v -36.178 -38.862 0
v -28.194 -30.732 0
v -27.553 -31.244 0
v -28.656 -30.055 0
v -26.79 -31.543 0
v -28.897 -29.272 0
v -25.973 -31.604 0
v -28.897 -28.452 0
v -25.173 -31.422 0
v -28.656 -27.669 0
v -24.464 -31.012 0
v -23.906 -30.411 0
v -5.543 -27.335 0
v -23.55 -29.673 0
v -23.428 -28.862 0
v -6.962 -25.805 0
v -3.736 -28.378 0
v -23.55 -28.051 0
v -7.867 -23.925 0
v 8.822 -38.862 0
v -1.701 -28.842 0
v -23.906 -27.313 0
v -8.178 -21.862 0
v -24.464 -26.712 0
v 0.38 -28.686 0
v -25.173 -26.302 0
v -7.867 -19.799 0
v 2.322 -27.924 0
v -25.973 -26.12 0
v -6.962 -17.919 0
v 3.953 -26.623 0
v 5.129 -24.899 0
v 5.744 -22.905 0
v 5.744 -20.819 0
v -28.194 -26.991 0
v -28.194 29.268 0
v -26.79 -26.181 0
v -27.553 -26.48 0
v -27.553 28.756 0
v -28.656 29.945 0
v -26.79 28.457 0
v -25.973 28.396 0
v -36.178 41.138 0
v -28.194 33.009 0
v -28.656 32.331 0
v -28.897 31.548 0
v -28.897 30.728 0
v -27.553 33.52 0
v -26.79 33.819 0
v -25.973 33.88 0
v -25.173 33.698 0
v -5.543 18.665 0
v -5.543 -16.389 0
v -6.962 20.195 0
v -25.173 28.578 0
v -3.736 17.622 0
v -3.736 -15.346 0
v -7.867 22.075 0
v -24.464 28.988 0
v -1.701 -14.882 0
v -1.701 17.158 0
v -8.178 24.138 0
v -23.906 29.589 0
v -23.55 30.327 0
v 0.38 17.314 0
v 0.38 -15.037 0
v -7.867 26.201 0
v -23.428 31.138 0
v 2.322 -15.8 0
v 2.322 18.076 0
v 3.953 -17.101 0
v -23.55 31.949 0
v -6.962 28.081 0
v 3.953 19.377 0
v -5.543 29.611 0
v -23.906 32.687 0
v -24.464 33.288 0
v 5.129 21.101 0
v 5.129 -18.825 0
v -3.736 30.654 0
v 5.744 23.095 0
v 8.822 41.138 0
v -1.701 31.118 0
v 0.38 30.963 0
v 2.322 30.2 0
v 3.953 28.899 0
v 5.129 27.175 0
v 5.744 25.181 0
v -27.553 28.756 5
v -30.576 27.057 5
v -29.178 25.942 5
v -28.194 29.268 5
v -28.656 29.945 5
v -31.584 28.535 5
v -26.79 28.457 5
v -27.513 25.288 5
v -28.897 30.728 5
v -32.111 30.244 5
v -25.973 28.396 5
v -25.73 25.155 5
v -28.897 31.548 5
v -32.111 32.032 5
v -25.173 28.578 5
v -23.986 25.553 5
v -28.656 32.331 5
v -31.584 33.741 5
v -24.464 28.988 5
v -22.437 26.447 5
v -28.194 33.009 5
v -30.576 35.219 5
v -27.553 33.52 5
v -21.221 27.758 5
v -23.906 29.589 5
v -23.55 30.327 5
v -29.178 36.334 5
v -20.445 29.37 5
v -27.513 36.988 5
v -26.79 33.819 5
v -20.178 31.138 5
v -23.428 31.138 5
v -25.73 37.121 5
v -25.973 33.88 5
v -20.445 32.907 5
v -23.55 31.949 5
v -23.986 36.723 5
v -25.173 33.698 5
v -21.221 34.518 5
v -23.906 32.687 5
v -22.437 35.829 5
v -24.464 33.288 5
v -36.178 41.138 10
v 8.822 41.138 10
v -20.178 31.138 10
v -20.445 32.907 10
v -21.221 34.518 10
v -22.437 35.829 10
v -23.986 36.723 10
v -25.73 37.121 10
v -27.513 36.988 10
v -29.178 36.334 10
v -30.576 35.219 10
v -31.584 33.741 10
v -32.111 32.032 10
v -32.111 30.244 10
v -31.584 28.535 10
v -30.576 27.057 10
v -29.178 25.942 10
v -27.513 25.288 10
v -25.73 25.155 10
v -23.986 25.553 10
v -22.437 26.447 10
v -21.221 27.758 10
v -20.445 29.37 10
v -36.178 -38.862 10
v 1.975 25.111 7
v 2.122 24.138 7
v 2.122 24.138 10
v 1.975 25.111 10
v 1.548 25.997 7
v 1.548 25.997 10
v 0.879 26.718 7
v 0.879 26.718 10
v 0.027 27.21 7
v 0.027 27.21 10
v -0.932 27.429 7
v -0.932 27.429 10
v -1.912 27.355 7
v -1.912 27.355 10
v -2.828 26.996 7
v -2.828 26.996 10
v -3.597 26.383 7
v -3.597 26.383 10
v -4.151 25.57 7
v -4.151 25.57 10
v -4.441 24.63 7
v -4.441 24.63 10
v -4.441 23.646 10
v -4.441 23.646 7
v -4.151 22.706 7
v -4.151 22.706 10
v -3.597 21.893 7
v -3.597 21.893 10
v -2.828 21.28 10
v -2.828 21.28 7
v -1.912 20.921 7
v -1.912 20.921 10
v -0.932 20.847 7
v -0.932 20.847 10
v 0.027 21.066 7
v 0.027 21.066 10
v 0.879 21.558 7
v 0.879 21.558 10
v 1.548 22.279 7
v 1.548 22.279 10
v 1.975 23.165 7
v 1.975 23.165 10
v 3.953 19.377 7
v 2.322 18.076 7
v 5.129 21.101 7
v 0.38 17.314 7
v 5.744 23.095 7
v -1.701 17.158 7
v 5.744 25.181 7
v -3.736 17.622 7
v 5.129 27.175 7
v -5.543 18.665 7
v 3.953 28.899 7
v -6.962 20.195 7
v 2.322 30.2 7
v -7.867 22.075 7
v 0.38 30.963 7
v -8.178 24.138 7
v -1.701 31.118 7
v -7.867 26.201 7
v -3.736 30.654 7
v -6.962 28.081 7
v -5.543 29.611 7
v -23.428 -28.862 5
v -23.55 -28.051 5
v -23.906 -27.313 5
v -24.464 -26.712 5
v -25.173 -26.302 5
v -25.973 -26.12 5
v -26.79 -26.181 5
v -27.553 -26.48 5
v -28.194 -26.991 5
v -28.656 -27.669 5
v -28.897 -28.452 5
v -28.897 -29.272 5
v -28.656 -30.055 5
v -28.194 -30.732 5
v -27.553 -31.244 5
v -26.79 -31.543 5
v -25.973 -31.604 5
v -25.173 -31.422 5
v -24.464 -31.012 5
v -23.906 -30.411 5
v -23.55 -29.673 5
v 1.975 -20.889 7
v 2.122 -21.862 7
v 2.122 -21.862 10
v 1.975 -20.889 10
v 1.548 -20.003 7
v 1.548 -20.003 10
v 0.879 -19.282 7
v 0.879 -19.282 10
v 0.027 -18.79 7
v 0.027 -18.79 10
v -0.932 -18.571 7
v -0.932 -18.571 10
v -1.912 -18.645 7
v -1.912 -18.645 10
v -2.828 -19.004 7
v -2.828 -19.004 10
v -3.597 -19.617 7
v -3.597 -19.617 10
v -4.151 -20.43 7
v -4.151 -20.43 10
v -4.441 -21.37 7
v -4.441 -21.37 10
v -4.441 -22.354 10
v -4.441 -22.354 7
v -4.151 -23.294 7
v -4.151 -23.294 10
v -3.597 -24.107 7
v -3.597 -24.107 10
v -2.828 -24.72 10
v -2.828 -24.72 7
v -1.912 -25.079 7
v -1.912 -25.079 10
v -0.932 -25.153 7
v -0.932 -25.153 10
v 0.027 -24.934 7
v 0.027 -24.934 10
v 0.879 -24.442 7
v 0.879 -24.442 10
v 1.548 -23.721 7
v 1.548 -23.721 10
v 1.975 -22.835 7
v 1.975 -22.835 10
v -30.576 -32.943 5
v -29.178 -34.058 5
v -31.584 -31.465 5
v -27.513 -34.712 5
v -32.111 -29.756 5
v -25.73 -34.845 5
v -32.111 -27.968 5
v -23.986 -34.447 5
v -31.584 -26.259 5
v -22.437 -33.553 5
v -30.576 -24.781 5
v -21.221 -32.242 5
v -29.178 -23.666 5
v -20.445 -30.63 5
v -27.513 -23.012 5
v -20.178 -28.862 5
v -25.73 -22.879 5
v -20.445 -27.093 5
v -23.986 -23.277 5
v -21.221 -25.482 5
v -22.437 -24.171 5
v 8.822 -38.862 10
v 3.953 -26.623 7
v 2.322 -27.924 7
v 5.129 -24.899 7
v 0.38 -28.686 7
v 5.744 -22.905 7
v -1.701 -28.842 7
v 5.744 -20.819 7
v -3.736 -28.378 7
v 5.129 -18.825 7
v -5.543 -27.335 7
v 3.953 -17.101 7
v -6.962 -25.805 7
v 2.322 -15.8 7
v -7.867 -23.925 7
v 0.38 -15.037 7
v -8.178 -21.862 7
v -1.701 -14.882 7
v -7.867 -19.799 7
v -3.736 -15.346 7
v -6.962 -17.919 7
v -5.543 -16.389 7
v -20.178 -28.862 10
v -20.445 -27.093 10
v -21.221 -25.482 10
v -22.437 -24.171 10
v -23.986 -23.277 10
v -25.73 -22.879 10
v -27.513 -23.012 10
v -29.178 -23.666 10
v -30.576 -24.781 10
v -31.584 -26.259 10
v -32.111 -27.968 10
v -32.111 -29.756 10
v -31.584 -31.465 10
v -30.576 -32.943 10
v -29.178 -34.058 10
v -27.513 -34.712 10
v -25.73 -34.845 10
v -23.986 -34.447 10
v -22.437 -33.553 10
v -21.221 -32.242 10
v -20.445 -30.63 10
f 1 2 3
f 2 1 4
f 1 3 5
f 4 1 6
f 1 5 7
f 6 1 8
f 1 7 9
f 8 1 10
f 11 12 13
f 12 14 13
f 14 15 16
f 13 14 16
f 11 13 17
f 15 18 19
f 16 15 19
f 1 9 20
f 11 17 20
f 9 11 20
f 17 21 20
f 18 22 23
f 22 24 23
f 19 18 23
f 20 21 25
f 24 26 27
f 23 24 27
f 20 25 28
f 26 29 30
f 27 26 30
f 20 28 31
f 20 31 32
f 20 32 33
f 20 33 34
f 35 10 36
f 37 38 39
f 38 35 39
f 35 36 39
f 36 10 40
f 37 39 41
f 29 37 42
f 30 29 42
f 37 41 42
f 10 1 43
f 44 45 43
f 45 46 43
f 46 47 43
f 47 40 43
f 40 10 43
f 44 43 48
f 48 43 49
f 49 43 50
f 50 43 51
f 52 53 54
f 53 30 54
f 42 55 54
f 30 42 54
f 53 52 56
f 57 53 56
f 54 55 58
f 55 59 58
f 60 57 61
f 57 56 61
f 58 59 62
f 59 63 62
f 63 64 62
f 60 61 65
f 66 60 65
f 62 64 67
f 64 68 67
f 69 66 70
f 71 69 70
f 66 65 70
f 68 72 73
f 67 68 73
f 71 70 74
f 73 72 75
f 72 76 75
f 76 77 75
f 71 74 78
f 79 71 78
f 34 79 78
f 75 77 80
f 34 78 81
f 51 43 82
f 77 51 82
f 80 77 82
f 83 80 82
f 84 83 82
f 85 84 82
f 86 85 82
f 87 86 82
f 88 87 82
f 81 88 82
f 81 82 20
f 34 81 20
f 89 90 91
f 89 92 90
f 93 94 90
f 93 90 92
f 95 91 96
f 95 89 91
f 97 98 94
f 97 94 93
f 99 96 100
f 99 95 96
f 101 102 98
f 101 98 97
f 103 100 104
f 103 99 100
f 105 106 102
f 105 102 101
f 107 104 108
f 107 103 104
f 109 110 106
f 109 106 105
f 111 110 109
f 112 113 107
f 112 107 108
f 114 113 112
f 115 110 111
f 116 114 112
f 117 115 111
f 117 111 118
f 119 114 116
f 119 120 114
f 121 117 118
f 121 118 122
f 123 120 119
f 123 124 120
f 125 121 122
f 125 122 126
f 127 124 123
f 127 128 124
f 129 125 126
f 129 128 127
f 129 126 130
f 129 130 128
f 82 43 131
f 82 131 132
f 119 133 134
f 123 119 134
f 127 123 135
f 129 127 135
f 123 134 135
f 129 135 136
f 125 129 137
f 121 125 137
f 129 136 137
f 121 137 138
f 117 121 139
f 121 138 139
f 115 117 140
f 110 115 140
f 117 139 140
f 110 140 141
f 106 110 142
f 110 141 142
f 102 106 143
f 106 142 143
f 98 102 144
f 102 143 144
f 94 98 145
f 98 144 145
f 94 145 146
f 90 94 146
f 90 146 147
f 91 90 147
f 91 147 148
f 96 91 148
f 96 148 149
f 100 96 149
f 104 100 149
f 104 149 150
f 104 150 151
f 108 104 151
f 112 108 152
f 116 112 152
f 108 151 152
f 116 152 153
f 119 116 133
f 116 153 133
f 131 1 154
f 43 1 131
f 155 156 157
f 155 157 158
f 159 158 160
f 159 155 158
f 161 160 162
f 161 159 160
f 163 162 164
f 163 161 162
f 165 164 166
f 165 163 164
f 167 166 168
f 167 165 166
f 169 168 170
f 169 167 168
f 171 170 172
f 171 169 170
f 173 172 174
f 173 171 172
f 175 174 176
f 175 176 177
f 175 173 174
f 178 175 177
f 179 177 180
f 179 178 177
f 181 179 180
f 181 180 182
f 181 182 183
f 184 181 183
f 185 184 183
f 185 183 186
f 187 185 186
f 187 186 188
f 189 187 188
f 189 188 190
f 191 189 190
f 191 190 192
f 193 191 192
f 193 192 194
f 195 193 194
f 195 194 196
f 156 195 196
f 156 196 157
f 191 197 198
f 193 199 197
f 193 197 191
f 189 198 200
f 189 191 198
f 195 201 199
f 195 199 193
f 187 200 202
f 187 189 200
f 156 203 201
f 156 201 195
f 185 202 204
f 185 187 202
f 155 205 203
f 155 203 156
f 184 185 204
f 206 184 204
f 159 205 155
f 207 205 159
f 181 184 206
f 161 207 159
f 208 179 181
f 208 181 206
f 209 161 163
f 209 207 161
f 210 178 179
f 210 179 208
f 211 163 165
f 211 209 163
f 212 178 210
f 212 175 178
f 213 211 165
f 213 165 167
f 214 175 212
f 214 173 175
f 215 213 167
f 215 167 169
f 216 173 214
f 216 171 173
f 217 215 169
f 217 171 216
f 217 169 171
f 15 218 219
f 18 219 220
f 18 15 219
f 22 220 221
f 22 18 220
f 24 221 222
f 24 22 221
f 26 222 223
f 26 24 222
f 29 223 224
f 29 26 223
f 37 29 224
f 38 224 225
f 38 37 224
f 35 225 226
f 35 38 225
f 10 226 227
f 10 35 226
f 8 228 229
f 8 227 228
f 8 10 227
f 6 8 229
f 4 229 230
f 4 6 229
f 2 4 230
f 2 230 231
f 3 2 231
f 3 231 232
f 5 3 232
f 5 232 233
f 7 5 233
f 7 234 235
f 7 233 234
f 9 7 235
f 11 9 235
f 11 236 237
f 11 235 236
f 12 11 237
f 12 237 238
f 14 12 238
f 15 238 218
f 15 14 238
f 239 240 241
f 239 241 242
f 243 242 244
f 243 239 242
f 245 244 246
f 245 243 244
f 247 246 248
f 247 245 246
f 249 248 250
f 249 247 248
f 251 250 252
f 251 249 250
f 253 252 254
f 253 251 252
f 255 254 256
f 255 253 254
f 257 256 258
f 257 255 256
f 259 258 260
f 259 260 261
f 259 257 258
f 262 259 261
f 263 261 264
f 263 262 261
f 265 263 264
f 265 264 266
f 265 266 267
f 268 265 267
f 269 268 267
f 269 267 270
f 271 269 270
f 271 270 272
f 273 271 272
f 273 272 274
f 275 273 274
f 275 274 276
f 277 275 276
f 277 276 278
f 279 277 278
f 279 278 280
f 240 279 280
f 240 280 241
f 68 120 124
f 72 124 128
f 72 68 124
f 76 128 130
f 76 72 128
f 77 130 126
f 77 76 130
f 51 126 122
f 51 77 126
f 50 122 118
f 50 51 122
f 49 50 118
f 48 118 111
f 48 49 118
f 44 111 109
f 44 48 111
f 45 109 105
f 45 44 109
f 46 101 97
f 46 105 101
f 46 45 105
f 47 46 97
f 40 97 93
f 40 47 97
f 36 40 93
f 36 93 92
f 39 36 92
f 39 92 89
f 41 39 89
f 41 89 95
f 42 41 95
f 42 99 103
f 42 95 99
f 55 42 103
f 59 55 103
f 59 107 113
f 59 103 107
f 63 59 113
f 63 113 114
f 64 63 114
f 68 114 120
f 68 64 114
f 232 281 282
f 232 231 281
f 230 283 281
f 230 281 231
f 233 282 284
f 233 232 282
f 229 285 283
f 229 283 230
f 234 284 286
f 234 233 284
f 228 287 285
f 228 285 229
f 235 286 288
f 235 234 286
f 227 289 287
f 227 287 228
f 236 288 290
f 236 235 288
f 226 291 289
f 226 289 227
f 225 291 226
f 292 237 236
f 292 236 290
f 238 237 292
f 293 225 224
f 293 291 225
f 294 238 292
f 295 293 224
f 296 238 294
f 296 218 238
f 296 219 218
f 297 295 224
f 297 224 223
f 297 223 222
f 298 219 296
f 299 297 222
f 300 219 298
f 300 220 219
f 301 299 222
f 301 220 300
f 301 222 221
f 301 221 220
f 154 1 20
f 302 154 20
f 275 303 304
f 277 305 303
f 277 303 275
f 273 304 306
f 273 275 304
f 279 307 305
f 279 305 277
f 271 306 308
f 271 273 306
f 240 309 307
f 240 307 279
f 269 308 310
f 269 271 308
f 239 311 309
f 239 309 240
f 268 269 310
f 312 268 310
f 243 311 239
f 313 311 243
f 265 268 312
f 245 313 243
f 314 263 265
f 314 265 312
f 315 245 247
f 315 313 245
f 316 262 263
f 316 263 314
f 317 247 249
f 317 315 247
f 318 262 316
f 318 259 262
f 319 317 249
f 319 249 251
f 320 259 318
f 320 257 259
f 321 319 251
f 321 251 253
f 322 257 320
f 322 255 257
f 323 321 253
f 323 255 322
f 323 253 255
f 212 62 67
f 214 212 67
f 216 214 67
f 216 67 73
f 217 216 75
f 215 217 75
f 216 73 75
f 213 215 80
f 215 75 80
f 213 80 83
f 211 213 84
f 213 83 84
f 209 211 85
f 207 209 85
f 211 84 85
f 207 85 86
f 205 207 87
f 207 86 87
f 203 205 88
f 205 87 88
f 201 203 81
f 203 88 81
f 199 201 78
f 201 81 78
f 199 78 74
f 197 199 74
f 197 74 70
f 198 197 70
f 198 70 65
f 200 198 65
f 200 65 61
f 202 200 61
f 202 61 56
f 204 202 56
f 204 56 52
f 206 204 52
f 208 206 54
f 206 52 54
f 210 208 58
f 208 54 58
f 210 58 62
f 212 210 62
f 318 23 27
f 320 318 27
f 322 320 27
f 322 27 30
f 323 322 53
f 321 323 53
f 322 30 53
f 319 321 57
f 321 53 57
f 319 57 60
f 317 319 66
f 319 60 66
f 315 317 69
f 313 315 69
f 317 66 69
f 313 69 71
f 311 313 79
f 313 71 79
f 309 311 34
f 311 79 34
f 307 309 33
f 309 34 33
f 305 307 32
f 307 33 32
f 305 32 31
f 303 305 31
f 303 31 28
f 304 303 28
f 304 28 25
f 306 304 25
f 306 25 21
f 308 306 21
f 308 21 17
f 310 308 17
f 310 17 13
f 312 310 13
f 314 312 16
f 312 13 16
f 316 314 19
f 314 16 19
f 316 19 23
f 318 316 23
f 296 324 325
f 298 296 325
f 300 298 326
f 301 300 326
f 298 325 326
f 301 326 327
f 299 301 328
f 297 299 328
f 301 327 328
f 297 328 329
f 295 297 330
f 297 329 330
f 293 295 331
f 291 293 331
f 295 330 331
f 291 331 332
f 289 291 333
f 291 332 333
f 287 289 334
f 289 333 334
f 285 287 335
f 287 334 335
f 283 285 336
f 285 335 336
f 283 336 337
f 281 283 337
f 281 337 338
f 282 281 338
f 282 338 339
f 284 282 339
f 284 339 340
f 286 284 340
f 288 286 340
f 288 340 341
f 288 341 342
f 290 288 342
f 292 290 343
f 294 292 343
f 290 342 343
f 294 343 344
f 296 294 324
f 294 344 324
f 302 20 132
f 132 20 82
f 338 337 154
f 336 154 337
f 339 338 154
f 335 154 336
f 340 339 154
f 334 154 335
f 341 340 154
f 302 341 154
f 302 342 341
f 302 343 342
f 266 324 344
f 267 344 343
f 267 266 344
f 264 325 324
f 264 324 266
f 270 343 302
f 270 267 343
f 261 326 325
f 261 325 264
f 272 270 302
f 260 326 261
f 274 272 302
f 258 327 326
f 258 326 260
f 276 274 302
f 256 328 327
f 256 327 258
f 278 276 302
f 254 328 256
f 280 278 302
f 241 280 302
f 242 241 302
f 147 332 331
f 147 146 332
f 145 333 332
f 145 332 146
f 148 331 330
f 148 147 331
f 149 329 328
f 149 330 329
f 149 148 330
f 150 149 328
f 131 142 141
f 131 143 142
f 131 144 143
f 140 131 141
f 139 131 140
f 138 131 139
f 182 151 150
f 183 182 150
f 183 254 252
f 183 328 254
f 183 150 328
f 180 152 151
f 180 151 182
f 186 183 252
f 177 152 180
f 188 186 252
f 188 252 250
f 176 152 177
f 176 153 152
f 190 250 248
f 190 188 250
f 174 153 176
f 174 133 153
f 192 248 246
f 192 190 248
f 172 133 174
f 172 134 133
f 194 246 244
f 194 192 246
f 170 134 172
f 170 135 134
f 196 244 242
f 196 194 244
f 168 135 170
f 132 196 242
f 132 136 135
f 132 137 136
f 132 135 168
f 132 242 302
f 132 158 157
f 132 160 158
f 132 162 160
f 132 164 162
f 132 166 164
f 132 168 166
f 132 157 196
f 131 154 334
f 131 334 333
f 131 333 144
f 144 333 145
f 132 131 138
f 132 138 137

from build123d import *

# Parameters (mm, degrees)
ESQUISSE1_W             = 45
ESQUISSE1_H             = 80
ESQUISSE1_R             = 3.3
ESQUISSE1_R_2           = 2.75
BOSS_EXTRU_1_DEPTH      = 10
ESQUISSE2_R             = 6
ENL_V_MAT_EXTRU_1_DEPTH = 5
ESQUISSE3_R             = 7
ENL_V_MAT_EXTRU_3_DEPTH = 7


with BuildPart() as part:
    # Esquisse1 → Boss.-Extru.1 (new body)
    with BuildSketch(Plane.XY):
        with Locations((-13.678136106, 1.138047212)):
            Rectangle(ESQUISSE1_W, ESQUISSE1_H)
        with Locations((-1.178136106, 24.138047212)):
            Circle(ESQUISSE1_R, mode=Mode.SUBTRACT)
        with Locations((-1.178136106, -21.861952788)):
            Circle(ESQUISSE1_R, mode=Mode.SUBTRACT)
        with Locations((-26.178136106, 31.138047212)):
            Circle(ESQUISSE1_R_2, mode=Mode.SUBTRACT)
        with Locations((-26.178136106, -28.861952788)):
            Circle(ESQUISSE1_R_2, mode=Mode.SUBTRACT)
    extrude(amount=BOSS_EXTRU_1_DEPTH)

    # Esquisse2 → Enlèv. mat.-Extru.1 (cut)
    with BuildSketch(Plane.XY.offset(10)):
        with Locations((-26.178136106, 31.138047212)):
            Circle(ESQUISSE2_R)
        with Locations((-26.178136106, -28.861952788)):
            Circle(ESQUISSE2_R)
    extrude(amount=-ENL_V_MAT_EXTRU_1_DEPTH, mode=Mode.SUBTRACT)

    # Esquisse3 → Enlèv. mat.-Extru.3 (cut)
    with BuildSketch(Plane(origin=(0, 0, 0), x_dir=(-1, 0, 0), z_dir=(0, 0, -1))):
        with Locations((1.178136106, 24.138047212)):
            Circle(ESQUISSE3_R)
        with Locations((1.178136106, -21.861952788)):
            Circle(ESQUISSE3_R)
    extrude(amount=-ENL_V_MAT_EXTRU_3_DEPTH, mode=Mode.SUBTRACT)


solid = part.part
